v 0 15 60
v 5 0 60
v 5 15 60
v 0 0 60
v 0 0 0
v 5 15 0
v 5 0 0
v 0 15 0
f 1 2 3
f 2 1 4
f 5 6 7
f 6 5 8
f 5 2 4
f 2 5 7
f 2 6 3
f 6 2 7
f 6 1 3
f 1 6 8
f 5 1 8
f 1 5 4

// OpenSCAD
// file: common.scad
$fa = 1;
$fs = .4;

// Base, vertical part
BASE_H1 = 40;
BASE_W1 = 3;
BASE_D1 = 30;

// Base, horizontal part
BASE_H2 = 6;
BASE_W2 = 40;
BASE_D2 = BASE_D1;

// Base bevel
BEVEL_WALL = 4;
BEVEL_H = 10;
BEVEL_FILLET = 4;

// Stick
STICK_H = 160;
STICK_W = 5;
STICK_D = 15;

// Head
HEAD_H = 25;
HEAD_BEVEL_H = 10;

// Fit tolerances
PRESS_FIT = 0;
TIGHT_FIT = .13;
NORMAL_FIT = .250;
LOOSE_FIT = .5;

DELTA = .01;

// Top base
TOP_BASE_H = 3;
TOP_BASE_W = 30;
TOP_BASE_D = 40;

// Top stick
TOP_STICK_H = 60;
// main file
include <common.scad>;

// Stick
cube([STICK_W, STICK_D, TOP_STICK_H]);
